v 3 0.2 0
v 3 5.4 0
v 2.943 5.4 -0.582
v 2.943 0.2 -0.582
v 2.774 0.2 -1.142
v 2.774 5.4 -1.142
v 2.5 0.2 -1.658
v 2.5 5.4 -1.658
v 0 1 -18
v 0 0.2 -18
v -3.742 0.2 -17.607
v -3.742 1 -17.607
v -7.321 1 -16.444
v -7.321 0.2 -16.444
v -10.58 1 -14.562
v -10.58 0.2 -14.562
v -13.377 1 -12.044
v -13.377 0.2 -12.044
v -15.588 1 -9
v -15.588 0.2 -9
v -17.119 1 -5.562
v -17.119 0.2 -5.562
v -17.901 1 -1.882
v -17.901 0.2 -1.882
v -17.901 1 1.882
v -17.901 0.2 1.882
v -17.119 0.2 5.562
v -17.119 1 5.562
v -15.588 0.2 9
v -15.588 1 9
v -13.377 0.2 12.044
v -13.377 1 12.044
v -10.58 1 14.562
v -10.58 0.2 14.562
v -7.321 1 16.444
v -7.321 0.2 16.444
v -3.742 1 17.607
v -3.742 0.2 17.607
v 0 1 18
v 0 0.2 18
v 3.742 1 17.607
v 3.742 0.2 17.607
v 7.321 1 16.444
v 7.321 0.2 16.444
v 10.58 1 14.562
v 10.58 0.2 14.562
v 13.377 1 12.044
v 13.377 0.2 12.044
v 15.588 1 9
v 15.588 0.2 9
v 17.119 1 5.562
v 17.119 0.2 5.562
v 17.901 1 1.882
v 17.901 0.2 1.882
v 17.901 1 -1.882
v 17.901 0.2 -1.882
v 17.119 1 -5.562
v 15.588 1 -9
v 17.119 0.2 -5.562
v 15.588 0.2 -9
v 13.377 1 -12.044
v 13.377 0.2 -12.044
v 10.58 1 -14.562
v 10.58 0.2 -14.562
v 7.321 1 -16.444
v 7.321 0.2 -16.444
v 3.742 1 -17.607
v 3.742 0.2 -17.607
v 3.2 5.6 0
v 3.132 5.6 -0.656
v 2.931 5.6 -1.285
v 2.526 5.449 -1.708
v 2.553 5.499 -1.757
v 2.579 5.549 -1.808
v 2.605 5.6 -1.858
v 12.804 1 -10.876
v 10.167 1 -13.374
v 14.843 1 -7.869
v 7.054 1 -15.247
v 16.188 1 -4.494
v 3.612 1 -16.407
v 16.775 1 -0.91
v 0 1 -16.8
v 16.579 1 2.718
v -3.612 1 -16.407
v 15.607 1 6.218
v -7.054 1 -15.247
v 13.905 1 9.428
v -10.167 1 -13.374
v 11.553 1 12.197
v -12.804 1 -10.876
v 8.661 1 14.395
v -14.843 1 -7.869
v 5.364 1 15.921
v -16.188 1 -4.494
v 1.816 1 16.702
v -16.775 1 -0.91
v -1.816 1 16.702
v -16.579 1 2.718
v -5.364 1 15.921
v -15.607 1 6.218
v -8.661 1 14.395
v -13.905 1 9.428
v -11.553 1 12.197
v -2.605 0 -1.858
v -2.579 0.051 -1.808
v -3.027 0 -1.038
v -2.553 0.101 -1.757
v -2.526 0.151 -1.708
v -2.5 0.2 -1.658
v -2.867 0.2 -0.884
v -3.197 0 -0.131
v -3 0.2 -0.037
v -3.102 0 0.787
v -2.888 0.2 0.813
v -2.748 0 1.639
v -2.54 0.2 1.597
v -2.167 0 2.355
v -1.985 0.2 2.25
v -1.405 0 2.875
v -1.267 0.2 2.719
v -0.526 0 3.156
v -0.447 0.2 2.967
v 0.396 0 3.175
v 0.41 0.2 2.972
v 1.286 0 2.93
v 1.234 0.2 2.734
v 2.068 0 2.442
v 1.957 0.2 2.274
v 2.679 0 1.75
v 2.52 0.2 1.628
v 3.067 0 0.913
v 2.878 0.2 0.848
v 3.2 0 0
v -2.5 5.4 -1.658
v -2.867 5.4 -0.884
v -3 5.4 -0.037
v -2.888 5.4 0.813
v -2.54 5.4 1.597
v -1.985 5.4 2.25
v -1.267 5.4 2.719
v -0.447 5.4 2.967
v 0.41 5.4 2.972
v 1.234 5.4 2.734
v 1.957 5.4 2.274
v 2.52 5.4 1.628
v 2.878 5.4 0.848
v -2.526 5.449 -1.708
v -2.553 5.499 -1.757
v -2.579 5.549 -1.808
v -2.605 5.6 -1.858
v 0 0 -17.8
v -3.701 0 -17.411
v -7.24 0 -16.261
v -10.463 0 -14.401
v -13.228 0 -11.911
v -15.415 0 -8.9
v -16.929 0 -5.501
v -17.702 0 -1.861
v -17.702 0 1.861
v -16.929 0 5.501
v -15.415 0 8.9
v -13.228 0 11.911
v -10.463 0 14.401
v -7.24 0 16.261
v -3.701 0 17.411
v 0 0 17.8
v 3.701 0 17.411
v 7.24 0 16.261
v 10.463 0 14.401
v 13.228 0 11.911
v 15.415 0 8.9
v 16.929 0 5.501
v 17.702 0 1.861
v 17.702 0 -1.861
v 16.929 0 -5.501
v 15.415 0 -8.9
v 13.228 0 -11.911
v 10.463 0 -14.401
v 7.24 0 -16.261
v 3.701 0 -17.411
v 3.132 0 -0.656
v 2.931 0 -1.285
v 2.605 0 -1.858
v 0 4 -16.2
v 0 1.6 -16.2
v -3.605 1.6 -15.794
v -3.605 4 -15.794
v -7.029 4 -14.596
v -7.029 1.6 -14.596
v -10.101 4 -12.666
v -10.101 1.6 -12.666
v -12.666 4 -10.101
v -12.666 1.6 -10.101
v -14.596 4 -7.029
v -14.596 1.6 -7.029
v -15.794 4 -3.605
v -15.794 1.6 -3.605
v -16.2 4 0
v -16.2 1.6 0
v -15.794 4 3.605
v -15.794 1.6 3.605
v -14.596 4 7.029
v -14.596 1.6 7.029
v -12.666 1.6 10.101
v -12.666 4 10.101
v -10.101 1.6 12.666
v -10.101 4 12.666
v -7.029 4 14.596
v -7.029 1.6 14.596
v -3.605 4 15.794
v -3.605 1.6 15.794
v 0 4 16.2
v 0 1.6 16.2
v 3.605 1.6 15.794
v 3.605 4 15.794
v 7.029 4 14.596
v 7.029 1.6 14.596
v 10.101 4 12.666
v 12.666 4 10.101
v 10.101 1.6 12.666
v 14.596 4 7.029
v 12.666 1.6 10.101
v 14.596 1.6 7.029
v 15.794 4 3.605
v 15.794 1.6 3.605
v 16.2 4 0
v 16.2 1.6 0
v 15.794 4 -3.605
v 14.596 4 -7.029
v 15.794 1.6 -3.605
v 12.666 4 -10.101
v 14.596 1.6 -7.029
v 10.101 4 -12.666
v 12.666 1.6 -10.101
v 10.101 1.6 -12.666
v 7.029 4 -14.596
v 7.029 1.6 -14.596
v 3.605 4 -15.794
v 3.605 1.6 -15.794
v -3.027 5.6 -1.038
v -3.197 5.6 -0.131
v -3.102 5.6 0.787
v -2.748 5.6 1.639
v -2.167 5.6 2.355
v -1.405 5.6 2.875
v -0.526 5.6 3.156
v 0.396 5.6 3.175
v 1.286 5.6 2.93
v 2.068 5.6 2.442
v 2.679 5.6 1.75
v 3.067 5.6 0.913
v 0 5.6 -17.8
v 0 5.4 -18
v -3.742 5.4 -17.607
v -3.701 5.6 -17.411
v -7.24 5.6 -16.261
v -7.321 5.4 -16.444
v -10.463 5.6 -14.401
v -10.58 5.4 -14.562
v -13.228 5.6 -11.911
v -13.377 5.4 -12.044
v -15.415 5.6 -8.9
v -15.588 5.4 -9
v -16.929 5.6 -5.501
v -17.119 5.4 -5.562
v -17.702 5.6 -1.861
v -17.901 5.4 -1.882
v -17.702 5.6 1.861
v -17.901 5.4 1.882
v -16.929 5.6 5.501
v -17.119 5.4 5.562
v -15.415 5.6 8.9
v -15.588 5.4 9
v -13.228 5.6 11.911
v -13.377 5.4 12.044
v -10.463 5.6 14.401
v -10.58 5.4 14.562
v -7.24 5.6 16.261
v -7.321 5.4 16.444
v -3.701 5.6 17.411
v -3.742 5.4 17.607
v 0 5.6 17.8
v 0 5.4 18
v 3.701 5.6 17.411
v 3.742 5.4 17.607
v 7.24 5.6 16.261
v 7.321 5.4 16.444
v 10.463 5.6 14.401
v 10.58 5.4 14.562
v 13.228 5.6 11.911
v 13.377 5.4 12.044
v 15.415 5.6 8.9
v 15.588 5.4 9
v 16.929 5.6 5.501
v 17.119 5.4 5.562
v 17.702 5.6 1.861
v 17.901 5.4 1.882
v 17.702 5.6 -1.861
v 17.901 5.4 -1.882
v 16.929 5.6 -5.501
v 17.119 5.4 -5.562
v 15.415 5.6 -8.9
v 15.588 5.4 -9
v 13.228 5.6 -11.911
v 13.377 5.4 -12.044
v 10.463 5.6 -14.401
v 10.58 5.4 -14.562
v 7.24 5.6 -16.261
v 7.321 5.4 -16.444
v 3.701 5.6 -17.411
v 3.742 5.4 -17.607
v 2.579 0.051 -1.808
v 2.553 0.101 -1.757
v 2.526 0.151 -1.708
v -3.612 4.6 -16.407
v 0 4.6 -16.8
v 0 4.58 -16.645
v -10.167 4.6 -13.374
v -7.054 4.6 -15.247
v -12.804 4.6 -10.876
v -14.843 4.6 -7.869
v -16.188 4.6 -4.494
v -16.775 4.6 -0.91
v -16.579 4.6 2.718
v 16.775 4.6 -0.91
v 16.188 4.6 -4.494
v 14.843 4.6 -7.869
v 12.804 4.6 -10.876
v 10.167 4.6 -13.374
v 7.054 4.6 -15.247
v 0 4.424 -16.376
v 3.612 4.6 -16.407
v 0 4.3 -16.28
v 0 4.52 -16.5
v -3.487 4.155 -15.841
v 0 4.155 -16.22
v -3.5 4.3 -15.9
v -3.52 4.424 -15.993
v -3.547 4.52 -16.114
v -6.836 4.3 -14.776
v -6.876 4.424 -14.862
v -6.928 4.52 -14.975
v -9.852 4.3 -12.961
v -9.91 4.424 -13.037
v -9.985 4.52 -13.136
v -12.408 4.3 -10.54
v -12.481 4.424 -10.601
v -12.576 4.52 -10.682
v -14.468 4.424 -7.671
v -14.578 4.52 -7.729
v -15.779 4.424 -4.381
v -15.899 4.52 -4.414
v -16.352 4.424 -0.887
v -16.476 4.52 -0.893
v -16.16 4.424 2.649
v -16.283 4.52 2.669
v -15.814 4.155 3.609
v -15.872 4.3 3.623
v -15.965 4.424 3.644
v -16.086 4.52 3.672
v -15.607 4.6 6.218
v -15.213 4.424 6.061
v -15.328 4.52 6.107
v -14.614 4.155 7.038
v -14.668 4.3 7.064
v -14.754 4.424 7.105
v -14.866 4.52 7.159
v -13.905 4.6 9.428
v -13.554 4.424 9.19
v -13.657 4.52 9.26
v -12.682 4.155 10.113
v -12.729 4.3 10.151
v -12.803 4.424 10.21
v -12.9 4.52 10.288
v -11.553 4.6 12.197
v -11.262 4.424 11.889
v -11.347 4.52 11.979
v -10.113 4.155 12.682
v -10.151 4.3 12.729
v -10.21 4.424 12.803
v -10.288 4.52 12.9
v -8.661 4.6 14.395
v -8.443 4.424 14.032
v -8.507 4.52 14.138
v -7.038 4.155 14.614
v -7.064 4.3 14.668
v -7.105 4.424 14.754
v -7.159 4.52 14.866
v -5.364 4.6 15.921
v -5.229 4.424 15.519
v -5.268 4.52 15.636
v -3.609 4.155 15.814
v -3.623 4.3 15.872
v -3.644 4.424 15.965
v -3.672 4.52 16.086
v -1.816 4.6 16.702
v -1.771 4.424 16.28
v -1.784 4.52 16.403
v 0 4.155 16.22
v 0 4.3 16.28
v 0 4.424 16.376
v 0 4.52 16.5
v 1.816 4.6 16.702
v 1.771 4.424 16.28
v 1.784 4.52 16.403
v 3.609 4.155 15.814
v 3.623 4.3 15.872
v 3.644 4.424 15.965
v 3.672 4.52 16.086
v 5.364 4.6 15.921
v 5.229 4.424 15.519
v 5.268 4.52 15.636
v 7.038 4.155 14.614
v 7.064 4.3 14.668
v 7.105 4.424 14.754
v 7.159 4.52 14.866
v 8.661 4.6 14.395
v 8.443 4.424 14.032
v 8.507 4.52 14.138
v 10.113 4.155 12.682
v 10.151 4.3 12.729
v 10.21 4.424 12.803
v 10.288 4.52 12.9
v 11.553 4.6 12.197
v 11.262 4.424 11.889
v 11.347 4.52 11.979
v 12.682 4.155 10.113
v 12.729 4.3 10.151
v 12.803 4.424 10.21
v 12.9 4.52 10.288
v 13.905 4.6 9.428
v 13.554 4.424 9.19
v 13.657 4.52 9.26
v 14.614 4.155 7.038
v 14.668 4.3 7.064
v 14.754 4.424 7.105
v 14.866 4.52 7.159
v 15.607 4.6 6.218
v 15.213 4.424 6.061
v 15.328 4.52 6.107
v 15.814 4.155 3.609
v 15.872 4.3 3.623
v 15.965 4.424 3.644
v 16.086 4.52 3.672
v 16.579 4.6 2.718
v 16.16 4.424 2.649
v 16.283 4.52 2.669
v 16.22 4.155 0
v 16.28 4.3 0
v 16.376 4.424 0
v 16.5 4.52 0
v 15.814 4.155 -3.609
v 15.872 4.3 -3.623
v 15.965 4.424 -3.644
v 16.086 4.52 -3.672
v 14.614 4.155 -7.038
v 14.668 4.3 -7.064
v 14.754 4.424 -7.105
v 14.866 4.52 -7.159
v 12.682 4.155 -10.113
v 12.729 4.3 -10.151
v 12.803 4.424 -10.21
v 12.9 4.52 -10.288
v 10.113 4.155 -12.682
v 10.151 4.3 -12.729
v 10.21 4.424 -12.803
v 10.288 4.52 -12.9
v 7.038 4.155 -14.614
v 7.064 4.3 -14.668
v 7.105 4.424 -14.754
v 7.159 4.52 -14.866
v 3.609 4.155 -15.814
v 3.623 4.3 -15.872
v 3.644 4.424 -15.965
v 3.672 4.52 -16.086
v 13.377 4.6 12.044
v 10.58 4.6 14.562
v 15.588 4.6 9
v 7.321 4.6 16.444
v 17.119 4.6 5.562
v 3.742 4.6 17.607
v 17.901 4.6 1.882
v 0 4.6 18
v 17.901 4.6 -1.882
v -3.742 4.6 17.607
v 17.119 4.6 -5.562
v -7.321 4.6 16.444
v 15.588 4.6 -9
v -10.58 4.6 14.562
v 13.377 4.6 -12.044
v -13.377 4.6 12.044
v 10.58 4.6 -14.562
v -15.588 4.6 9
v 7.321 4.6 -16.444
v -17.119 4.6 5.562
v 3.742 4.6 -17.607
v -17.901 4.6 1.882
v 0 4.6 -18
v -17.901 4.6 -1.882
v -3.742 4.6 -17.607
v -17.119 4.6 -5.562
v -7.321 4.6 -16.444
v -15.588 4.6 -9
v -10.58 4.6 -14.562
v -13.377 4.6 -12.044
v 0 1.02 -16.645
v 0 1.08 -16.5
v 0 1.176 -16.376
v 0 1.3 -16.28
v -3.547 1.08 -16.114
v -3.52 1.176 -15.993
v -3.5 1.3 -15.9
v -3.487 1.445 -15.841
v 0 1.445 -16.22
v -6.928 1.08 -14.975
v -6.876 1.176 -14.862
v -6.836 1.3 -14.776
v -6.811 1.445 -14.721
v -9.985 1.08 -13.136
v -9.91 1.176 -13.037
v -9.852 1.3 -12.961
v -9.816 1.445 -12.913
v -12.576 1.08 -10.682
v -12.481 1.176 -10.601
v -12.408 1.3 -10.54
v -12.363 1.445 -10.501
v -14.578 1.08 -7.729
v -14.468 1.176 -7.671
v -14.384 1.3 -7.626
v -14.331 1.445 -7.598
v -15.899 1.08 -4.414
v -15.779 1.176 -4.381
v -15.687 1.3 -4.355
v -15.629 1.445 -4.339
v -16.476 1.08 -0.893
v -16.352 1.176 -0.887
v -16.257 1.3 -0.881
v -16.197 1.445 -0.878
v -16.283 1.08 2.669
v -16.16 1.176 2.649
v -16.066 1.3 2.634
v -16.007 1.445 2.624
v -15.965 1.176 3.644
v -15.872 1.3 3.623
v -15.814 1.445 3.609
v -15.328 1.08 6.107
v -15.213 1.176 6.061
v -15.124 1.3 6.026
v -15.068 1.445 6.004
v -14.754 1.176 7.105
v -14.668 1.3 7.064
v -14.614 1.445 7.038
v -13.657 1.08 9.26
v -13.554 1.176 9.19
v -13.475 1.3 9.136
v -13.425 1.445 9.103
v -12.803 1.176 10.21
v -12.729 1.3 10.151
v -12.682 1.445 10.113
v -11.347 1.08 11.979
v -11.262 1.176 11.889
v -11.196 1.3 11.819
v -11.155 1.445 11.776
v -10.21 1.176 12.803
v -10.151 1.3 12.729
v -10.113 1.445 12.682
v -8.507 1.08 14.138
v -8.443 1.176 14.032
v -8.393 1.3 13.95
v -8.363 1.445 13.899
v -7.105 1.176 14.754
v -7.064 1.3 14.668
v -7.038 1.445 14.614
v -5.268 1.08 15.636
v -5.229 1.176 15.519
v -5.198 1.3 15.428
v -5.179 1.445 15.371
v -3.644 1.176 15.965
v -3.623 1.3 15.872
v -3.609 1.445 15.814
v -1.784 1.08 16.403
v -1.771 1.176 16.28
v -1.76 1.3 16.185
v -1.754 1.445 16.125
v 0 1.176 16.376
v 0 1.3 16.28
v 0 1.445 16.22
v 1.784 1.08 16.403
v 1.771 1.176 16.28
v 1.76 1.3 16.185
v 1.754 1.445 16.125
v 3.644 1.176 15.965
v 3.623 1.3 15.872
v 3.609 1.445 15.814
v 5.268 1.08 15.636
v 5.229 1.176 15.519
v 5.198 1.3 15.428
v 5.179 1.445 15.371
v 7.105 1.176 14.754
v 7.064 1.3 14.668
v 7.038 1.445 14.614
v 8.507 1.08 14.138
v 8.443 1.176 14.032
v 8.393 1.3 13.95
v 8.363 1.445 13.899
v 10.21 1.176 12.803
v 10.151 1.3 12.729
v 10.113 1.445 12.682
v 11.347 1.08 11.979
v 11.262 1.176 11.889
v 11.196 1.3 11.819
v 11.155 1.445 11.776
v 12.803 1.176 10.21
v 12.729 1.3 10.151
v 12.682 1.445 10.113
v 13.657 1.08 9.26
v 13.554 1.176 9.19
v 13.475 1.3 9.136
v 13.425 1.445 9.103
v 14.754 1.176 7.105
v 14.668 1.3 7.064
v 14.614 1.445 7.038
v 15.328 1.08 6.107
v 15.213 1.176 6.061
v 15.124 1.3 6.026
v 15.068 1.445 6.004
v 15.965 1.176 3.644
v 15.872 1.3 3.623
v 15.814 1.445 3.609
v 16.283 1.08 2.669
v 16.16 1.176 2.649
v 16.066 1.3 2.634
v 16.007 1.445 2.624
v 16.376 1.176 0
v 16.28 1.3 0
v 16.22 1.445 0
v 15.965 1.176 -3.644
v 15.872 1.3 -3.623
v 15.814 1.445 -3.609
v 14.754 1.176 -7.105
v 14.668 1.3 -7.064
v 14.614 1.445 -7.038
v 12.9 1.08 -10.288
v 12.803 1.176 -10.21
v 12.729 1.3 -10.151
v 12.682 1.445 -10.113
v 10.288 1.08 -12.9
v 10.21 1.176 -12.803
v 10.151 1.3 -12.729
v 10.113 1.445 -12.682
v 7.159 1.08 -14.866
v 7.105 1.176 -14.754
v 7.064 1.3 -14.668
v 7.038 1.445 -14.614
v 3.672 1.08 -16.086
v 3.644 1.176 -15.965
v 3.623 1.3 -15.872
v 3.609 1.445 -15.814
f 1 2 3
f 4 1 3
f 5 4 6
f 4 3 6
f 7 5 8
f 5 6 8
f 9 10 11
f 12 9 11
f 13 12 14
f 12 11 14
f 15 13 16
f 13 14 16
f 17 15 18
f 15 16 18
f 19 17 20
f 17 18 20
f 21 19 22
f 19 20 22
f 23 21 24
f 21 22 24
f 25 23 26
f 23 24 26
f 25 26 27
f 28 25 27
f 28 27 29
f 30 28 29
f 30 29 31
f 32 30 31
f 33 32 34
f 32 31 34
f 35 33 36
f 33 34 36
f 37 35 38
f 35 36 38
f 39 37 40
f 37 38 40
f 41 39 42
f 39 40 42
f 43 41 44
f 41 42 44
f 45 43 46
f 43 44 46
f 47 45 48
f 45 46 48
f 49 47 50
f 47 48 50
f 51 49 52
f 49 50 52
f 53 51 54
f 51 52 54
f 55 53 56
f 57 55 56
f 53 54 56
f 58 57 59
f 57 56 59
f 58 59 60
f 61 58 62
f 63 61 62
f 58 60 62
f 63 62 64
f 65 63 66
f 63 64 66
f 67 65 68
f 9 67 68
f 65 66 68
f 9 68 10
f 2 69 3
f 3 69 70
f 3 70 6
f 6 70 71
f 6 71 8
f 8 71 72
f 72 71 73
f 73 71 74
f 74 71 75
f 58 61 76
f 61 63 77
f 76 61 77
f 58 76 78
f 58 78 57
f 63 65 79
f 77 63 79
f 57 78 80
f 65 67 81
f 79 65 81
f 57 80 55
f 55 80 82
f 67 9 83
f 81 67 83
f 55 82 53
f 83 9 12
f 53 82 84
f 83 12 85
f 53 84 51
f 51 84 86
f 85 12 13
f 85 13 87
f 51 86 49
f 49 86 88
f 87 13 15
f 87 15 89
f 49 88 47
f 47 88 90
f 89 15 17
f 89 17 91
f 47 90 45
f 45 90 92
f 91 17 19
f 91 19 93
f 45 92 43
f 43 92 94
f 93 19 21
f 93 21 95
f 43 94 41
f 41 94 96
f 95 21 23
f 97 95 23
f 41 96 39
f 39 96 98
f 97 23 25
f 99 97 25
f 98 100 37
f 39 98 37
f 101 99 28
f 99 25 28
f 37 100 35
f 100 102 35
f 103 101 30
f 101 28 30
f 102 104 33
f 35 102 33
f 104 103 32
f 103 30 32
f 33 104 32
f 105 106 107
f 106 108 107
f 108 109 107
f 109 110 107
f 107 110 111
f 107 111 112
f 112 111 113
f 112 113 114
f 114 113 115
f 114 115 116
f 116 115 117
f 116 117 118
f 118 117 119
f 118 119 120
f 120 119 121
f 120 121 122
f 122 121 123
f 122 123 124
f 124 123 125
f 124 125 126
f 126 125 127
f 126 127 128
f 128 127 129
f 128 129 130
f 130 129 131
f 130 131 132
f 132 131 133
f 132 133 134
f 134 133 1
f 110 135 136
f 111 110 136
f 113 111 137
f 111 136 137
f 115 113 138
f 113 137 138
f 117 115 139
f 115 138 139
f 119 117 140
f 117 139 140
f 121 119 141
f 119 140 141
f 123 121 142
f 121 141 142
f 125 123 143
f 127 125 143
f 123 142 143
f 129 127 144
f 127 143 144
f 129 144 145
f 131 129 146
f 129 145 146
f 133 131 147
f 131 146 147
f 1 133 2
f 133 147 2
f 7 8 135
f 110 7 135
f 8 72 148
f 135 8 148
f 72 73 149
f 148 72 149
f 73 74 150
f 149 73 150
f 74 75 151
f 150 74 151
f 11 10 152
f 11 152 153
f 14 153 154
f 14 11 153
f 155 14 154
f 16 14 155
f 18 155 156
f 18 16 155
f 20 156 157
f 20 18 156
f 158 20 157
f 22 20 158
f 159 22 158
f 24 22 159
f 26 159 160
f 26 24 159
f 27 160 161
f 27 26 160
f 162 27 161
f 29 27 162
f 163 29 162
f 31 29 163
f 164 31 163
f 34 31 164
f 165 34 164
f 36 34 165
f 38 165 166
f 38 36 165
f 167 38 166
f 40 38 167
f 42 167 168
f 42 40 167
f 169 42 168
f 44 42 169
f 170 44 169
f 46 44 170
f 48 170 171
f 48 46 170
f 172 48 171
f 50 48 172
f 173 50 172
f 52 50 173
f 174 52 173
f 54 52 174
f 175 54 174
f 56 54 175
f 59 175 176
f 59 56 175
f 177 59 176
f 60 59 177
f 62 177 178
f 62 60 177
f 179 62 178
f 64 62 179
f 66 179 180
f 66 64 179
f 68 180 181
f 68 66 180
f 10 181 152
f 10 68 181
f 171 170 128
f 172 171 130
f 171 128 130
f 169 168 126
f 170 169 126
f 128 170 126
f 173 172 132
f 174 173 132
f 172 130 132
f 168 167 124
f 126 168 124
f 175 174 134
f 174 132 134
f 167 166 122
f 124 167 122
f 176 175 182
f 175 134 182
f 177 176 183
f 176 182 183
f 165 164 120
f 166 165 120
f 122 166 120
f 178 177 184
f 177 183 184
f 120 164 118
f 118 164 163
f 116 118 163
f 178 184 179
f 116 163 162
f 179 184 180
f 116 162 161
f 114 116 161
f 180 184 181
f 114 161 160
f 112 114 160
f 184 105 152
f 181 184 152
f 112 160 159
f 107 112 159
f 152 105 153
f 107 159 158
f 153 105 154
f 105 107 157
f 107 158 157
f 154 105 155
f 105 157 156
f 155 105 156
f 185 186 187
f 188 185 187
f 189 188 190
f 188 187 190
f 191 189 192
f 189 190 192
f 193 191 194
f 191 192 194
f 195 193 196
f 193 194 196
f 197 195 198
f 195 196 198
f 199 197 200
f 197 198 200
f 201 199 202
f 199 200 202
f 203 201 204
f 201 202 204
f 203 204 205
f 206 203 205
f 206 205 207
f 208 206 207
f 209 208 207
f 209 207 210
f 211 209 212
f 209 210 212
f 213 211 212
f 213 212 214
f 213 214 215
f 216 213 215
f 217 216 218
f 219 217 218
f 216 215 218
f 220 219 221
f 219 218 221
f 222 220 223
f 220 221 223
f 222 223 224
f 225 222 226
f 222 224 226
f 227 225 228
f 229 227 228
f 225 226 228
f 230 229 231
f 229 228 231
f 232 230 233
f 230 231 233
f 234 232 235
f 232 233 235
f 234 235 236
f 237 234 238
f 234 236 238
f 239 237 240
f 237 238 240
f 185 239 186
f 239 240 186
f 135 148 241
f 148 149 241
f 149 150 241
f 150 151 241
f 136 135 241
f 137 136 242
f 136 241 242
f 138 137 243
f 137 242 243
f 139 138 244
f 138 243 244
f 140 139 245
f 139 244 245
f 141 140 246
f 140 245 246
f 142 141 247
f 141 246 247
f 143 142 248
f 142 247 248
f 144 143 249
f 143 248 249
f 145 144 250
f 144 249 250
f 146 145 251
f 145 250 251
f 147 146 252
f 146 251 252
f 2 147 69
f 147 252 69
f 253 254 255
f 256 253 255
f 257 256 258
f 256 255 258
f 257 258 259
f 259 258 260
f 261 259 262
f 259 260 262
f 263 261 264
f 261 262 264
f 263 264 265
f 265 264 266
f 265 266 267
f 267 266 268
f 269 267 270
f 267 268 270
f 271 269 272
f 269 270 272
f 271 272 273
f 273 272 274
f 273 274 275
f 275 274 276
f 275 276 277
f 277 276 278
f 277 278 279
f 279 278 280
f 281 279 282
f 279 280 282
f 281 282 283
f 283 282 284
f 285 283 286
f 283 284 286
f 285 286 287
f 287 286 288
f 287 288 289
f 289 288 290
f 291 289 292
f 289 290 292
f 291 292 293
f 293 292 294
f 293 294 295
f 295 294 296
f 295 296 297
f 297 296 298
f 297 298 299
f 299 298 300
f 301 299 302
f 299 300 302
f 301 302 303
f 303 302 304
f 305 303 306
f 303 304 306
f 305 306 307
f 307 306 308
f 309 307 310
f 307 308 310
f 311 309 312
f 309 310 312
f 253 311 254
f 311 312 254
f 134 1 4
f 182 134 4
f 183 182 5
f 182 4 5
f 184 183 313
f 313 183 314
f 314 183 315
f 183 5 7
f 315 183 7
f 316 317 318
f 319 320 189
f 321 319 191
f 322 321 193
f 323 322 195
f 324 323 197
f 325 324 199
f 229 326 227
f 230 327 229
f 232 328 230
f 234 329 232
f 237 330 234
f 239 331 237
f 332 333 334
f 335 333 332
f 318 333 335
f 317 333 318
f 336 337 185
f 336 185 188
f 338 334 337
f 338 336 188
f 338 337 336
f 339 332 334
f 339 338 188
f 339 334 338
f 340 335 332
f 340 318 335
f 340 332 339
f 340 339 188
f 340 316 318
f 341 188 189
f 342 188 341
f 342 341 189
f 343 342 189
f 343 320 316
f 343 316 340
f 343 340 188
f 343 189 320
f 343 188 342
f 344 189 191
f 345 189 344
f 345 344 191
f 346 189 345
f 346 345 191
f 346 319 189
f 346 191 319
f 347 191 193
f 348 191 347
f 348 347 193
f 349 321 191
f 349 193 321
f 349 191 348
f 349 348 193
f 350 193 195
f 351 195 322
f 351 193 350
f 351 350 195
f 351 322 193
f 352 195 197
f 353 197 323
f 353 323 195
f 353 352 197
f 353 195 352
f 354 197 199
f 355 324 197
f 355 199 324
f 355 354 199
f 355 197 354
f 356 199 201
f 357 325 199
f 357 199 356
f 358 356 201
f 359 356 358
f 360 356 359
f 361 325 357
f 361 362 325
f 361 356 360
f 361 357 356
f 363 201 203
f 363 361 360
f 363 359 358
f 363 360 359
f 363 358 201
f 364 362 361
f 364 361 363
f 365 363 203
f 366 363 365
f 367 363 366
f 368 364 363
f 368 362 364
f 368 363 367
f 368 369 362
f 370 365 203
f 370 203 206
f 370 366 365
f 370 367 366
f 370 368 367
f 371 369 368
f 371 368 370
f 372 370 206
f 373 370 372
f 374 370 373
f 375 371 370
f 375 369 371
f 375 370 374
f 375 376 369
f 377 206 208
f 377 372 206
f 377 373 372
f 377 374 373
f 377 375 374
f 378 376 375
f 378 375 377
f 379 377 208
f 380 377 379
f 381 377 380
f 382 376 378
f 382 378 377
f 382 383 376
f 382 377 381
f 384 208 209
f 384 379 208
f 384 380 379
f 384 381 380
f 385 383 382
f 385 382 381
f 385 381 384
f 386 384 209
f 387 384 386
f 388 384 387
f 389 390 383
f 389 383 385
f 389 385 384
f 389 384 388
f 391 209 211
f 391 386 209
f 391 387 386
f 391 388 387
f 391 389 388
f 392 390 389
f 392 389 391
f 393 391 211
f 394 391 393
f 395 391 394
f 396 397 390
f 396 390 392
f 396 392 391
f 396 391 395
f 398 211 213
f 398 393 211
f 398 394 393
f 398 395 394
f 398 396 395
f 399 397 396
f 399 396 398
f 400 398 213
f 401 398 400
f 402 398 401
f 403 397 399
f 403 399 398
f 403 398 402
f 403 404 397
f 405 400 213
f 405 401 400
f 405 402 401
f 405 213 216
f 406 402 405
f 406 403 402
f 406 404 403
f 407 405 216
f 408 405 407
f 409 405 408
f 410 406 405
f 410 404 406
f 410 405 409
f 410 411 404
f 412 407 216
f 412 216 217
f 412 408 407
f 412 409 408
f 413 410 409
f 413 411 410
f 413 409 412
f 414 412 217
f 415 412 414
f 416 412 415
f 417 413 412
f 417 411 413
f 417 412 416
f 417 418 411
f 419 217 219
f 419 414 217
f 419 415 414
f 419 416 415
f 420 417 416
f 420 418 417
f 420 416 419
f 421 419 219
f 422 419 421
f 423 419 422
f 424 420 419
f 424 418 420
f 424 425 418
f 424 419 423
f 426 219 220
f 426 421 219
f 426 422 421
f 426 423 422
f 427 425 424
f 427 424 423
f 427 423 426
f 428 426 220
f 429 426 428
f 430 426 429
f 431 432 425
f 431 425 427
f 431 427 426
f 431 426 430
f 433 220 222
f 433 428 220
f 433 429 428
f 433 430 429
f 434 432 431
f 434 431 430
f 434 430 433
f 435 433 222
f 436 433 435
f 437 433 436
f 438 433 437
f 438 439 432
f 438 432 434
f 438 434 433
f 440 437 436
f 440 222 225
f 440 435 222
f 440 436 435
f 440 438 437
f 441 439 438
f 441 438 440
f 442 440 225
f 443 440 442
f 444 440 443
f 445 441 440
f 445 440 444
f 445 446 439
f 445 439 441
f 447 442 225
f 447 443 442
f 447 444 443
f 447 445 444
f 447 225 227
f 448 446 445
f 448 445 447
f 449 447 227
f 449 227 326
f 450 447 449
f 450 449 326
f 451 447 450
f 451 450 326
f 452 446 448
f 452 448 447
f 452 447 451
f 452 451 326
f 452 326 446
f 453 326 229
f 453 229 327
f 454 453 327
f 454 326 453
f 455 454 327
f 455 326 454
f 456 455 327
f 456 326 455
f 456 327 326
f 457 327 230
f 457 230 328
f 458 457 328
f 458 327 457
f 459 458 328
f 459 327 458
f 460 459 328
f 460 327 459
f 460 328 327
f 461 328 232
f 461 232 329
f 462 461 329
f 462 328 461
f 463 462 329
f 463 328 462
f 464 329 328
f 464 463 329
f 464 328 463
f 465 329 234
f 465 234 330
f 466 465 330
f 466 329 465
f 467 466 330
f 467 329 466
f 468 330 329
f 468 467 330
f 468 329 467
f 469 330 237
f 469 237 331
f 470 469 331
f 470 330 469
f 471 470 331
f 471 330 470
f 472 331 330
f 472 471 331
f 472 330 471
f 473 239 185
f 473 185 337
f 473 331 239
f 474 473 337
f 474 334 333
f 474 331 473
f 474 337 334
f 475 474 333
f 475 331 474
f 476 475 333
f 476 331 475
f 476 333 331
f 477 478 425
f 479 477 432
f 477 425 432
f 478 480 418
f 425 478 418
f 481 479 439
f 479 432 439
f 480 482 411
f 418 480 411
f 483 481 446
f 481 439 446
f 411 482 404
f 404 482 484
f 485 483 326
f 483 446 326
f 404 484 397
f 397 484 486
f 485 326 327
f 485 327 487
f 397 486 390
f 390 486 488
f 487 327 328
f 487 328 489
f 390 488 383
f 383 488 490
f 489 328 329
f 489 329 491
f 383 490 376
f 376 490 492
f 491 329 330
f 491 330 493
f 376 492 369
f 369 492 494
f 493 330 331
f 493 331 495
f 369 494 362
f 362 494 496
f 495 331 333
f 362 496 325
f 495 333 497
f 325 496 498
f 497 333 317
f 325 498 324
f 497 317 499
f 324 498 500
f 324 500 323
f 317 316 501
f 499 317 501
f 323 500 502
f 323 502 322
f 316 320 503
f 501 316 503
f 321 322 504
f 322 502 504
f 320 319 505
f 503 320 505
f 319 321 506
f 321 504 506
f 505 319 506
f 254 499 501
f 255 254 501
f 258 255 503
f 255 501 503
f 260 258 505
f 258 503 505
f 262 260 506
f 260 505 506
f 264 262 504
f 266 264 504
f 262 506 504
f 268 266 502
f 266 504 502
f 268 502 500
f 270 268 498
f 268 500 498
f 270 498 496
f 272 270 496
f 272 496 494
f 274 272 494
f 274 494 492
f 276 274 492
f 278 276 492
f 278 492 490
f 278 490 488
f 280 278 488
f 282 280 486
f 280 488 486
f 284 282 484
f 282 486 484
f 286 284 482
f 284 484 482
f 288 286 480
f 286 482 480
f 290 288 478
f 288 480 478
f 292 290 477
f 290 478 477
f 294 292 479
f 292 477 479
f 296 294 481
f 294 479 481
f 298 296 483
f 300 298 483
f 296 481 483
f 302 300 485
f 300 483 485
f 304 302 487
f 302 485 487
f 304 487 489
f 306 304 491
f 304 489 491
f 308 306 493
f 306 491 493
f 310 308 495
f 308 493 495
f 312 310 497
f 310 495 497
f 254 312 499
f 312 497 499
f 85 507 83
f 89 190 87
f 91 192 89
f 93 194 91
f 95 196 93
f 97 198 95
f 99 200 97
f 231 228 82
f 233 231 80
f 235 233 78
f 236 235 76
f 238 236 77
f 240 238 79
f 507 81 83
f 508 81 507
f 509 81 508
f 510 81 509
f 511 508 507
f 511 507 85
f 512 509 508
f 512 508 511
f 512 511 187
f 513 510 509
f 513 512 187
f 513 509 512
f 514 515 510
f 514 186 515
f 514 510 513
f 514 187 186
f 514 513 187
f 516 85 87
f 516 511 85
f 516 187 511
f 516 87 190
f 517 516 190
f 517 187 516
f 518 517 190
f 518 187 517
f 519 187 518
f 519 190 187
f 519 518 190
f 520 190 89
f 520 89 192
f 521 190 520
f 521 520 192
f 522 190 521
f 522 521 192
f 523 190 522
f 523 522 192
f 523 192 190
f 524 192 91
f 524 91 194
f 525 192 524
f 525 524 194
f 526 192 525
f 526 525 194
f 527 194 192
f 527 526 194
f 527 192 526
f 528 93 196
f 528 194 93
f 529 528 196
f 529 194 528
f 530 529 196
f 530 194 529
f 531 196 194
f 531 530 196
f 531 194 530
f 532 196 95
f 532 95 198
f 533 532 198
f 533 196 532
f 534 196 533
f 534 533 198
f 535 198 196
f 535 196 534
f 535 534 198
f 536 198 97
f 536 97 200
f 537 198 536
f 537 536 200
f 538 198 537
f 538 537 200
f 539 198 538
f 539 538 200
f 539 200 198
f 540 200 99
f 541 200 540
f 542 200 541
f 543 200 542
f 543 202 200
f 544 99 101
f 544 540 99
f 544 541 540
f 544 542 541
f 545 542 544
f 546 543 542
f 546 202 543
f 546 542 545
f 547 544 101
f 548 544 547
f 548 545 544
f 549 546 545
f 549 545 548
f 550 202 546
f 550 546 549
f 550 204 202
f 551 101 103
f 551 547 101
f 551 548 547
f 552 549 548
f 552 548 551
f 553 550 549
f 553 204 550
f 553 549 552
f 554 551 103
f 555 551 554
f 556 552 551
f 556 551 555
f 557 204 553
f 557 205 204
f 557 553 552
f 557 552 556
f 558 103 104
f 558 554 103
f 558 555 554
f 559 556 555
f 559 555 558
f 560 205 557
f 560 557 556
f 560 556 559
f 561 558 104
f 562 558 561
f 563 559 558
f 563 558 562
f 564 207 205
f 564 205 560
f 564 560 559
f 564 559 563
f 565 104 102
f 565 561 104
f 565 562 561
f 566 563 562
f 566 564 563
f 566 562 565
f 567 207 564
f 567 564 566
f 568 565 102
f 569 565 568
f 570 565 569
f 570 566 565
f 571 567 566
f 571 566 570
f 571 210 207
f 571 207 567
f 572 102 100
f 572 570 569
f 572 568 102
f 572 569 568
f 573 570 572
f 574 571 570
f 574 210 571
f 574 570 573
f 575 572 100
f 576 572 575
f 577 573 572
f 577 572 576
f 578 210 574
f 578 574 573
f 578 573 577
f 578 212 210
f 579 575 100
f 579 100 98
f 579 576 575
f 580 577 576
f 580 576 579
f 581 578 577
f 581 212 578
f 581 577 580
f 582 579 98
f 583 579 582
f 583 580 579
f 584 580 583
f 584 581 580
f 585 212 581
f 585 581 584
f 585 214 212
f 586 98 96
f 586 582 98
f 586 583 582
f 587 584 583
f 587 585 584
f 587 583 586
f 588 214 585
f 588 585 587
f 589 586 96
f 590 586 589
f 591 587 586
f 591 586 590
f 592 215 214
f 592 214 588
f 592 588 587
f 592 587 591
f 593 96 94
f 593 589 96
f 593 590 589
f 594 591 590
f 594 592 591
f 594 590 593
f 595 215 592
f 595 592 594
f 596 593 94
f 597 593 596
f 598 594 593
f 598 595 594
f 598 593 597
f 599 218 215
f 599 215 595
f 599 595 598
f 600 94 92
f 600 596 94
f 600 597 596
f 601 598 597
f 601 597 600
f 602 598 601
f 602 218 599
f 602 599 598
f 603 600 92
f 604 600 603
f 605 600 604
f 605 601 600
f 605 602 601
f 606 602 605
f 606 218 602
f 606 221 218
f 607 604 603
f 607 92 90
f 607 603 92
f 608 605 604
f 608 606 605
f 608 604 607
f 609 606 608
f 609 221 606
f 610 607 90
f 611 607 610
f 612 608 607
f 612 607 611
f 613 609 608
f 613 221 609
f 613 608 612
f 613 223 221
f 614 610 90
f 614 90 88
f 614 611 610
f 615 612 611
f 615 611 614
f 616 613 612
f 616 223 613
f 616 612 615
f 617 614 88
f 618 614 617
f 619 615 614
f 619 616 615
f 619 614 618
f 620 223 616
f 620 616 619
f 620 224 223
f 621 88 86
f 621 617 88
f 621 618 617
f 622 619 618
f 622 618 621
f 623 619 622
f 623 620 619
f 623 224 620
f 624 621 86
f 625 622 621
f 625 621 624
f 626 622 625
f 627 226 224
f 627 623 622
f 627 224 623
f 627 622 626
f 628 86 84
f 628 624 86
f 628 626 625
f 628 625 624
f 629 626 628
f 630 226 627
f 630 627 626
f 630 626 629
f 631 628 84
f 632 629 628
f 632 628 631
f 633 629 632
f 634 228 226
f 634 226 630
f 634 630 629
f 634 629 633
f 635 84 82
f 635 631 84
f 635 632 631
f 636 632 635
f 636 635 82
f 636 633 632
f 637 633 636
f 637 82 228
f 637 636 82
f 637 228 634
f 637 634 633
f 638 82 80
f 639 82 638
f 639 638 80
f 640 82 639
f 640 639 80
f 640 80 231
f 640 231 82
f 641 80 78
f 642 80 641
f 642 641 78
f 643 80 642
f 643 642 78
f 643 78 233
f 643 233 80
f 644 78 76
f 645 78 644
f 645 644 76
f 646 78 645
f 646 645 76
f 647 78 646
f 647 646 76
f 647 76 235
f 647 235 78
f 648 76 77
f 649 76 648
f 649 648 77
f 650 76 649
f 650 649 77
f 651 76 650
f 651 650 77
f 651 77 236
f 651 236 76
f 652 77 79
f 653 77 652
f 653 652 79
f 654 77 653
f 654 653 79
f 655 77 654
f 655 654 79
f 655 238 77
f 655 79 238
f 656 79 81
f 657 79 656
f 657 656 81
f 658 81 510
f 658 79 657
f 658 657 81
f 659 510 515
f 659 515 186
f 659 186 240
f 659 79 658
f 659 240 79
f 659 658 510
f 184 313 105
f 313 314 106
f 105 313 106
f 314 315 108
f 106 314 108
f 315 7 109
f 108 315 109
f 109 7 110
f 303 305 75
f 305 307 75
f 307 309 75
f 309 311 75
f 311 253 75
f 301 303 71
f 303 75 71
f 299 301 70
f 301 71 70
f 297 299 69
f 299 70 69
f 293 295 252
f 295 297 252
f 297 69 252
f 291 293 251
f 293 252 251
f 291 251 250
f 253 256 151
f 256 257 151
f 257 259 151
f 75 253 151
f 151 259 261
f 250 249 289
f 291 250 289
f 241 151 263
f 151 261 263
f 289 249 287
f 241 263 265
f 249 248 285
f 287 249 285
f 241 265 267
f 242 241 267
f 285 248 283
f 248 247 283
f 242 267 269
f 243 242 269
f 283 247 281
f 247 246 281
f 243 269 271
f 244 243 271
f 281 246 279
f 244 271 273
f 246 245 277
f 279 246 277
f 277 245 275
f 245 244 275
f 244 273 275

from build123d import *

# Parameters (mm, degrees)
CUT_EXTRUDE_2_DEPTH = 27.064535292
FILLET_1_R          = 0.6
CHAMFER_1_SIZE      = 0.2
CHAMFER_2_SIZE      = 0.2


with BuildPart() as part:
    # 草图1 → 旋转2 (revolve)
    with BuildSketch(Plane(origin=(0, 0, 0), x_dir=(0, 0, -1), z_dir=(1, 0, 0)), mode=Mode.PRIVATE) as revolve_2_sk:
        Polygon((-16.2, 1), (-18, 1), (-18, 0), (0, 0), (0, 5.6), (-18, 5.6), (-18, 4.6), (-16.2, 4.6), align=None)
    revolve(revolve_2_sk.sketch.rotate(Axis((0, 0, 0), (0, 1, 0)), 180), axis=Axis((0, 0, 0), (0, 1, 0)))

    # 草图2 → 切除-拉伸2 (cut, through all)
    with BuildSketch(Plane(origin=(0, 5.6, 0), x_dir=(1, 0, 0), z_dir=(0, 1, 0))):
        with BuildLine():
            Line((2.5, 1.658312395), (-2.5, 1.658312395))
            ThreePointArc((-2.5, 1.658312395), (-0.866025404, -2.872281323), (3, 0))
            ThreePointArc((3, 0), (2.872281323, 0.866025404), (2.5, 1.658312395))
        make_face()
    extrude(amount=-CUT_EXTRUDE_2_DEPTH, mode=Mode.SUBTRACT)

    # 圆角1
    fillet_1_edges = [part.edges().sort_by_distance(p)[0] for p in [
        (0, 1, 16.2),
        (0, 4.6, 16.2),
    ]]
    fillet(fillet_1_edges, radius=FILLET_1_R)

    # 倒角1
    chamfer_1_edges = [part.edges().sort_by_distance(p)[0] for p in [
        (0, 5.6, -1.658312395),
        (0, 0, 3),
        (0, 0, -1.658312395),
        (0, 5.6, 3),
    ]]
    chamfer(chamfer_1_edges, length=CHAMFER_1_SIZE)

    # 倒角2
    chamfer_2_edges = [part.edges().sort_by_distance(p)[0] for p in [
        (0, 0, 18),
        (0, 5.6, 18),
    ]]
    chamfer(chamfer_2_edges, length=CHAMFER_2_SIZE)


solid = part.part
